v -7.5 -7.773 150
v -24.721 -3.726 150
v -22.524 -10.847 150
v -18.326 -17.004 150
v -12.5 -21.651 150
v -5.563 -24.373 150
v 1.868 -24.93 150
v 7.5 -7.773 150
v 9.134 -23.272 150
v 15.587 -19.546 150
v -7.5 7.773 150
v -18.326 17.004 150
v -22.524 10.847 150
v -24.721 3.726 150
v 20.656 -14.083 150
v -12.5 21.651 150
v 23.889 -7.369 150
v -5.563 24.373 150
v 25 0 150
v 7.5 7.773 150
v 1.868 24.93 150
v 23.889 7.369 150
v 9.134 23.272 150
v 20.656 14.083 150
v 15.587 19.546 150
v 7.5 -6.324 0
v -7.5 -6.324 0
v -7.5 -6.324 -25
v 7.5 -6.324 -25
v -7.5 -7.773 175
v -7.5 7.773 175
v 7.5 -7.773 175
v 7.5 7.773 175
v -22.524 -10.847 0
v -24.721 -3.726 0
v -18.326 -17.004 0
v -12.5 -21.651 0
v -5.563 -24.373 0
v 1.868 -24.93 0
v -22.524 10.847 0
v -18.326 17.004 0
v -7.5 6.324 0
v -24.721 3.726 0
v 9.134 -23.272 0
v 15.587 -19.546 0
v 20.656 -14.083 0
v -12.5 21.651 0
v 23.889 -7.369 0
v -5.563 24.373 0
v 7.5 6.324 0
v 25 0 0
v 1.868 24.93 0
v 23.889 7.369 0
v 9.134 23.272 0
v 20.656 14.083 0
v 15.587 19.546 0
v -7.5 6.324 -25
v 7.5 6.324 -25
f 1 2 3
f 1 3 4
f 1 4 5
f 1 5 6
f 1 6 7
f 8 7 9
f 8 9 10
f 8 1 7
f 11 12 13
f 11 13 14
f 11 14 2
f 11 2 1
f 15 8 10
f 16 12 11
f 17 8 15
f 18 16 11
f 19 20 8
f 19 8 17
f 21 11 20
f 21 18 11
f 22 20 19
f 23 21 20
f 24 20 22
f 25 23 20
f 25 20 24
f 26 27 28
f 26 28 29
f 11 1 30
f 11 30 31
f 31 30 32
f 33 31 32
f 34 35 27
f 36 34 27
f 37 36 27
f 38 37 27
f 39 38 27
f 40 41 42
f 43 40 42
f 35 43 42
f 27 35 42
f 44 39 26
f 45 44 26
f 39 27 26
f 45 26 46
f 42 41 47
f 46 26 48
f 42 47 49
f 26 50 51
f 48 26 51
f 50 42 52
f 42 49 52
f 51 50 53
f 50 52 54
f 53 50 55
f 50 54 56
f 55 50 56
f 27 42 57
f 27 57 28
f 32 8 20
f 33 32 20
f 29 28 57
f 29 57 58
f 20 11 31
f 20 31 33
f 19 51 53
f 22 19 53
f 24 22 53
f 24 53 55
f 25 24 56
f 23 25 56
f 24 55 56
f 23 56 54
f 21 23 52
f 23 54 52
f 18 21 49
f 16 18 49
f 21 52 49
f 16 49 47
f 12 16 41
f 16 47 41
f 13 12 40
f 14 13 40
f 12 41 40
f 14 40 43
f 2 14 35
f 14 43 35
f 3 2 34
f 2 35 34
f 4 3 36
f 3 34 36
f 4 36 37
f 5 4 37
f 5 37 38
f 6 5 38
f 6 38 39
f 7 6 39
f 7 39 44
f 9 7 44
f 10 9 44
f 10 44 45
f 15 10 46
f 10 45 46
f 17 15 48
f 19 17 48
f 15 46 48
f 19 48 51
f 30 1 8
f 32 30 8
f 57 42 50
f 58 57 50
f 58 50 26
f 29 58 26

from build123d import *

# Parameters (mm, degrees)
F0_R     = 25
F1_DEPTH = 150
F2_W     = 15
F2_H     = 15.545452
F3_DEPTH = 25
F4_W     = 15
F4_H     = 12.647062
F5_DEPTH = 25


with BuildPart() as f1:
    # F0 (on Top) → F1 (new body)
    with BuildSketch(Plane.XY):
        Circle(F0_R)
    extrude(amount=F1_DEPTH)

    # F2 (on face) → F3 (join)
    with BuildSketch(Plane.XY.offset(150)):
        Rectangle(F2_W, F2_H)
    extrude(amount=F3_DEPTH)

    # F4 (on face) → F5 (join)
    with BuildSketch(Plane(origin=(0, 0, 0), x_dir=(1, 0, 0), z_dir=(0, 0, -1))):
        Rectangle(F4_W, F4_H)
    extrude(amount=F5_DEPTH)


solid = f1.part
